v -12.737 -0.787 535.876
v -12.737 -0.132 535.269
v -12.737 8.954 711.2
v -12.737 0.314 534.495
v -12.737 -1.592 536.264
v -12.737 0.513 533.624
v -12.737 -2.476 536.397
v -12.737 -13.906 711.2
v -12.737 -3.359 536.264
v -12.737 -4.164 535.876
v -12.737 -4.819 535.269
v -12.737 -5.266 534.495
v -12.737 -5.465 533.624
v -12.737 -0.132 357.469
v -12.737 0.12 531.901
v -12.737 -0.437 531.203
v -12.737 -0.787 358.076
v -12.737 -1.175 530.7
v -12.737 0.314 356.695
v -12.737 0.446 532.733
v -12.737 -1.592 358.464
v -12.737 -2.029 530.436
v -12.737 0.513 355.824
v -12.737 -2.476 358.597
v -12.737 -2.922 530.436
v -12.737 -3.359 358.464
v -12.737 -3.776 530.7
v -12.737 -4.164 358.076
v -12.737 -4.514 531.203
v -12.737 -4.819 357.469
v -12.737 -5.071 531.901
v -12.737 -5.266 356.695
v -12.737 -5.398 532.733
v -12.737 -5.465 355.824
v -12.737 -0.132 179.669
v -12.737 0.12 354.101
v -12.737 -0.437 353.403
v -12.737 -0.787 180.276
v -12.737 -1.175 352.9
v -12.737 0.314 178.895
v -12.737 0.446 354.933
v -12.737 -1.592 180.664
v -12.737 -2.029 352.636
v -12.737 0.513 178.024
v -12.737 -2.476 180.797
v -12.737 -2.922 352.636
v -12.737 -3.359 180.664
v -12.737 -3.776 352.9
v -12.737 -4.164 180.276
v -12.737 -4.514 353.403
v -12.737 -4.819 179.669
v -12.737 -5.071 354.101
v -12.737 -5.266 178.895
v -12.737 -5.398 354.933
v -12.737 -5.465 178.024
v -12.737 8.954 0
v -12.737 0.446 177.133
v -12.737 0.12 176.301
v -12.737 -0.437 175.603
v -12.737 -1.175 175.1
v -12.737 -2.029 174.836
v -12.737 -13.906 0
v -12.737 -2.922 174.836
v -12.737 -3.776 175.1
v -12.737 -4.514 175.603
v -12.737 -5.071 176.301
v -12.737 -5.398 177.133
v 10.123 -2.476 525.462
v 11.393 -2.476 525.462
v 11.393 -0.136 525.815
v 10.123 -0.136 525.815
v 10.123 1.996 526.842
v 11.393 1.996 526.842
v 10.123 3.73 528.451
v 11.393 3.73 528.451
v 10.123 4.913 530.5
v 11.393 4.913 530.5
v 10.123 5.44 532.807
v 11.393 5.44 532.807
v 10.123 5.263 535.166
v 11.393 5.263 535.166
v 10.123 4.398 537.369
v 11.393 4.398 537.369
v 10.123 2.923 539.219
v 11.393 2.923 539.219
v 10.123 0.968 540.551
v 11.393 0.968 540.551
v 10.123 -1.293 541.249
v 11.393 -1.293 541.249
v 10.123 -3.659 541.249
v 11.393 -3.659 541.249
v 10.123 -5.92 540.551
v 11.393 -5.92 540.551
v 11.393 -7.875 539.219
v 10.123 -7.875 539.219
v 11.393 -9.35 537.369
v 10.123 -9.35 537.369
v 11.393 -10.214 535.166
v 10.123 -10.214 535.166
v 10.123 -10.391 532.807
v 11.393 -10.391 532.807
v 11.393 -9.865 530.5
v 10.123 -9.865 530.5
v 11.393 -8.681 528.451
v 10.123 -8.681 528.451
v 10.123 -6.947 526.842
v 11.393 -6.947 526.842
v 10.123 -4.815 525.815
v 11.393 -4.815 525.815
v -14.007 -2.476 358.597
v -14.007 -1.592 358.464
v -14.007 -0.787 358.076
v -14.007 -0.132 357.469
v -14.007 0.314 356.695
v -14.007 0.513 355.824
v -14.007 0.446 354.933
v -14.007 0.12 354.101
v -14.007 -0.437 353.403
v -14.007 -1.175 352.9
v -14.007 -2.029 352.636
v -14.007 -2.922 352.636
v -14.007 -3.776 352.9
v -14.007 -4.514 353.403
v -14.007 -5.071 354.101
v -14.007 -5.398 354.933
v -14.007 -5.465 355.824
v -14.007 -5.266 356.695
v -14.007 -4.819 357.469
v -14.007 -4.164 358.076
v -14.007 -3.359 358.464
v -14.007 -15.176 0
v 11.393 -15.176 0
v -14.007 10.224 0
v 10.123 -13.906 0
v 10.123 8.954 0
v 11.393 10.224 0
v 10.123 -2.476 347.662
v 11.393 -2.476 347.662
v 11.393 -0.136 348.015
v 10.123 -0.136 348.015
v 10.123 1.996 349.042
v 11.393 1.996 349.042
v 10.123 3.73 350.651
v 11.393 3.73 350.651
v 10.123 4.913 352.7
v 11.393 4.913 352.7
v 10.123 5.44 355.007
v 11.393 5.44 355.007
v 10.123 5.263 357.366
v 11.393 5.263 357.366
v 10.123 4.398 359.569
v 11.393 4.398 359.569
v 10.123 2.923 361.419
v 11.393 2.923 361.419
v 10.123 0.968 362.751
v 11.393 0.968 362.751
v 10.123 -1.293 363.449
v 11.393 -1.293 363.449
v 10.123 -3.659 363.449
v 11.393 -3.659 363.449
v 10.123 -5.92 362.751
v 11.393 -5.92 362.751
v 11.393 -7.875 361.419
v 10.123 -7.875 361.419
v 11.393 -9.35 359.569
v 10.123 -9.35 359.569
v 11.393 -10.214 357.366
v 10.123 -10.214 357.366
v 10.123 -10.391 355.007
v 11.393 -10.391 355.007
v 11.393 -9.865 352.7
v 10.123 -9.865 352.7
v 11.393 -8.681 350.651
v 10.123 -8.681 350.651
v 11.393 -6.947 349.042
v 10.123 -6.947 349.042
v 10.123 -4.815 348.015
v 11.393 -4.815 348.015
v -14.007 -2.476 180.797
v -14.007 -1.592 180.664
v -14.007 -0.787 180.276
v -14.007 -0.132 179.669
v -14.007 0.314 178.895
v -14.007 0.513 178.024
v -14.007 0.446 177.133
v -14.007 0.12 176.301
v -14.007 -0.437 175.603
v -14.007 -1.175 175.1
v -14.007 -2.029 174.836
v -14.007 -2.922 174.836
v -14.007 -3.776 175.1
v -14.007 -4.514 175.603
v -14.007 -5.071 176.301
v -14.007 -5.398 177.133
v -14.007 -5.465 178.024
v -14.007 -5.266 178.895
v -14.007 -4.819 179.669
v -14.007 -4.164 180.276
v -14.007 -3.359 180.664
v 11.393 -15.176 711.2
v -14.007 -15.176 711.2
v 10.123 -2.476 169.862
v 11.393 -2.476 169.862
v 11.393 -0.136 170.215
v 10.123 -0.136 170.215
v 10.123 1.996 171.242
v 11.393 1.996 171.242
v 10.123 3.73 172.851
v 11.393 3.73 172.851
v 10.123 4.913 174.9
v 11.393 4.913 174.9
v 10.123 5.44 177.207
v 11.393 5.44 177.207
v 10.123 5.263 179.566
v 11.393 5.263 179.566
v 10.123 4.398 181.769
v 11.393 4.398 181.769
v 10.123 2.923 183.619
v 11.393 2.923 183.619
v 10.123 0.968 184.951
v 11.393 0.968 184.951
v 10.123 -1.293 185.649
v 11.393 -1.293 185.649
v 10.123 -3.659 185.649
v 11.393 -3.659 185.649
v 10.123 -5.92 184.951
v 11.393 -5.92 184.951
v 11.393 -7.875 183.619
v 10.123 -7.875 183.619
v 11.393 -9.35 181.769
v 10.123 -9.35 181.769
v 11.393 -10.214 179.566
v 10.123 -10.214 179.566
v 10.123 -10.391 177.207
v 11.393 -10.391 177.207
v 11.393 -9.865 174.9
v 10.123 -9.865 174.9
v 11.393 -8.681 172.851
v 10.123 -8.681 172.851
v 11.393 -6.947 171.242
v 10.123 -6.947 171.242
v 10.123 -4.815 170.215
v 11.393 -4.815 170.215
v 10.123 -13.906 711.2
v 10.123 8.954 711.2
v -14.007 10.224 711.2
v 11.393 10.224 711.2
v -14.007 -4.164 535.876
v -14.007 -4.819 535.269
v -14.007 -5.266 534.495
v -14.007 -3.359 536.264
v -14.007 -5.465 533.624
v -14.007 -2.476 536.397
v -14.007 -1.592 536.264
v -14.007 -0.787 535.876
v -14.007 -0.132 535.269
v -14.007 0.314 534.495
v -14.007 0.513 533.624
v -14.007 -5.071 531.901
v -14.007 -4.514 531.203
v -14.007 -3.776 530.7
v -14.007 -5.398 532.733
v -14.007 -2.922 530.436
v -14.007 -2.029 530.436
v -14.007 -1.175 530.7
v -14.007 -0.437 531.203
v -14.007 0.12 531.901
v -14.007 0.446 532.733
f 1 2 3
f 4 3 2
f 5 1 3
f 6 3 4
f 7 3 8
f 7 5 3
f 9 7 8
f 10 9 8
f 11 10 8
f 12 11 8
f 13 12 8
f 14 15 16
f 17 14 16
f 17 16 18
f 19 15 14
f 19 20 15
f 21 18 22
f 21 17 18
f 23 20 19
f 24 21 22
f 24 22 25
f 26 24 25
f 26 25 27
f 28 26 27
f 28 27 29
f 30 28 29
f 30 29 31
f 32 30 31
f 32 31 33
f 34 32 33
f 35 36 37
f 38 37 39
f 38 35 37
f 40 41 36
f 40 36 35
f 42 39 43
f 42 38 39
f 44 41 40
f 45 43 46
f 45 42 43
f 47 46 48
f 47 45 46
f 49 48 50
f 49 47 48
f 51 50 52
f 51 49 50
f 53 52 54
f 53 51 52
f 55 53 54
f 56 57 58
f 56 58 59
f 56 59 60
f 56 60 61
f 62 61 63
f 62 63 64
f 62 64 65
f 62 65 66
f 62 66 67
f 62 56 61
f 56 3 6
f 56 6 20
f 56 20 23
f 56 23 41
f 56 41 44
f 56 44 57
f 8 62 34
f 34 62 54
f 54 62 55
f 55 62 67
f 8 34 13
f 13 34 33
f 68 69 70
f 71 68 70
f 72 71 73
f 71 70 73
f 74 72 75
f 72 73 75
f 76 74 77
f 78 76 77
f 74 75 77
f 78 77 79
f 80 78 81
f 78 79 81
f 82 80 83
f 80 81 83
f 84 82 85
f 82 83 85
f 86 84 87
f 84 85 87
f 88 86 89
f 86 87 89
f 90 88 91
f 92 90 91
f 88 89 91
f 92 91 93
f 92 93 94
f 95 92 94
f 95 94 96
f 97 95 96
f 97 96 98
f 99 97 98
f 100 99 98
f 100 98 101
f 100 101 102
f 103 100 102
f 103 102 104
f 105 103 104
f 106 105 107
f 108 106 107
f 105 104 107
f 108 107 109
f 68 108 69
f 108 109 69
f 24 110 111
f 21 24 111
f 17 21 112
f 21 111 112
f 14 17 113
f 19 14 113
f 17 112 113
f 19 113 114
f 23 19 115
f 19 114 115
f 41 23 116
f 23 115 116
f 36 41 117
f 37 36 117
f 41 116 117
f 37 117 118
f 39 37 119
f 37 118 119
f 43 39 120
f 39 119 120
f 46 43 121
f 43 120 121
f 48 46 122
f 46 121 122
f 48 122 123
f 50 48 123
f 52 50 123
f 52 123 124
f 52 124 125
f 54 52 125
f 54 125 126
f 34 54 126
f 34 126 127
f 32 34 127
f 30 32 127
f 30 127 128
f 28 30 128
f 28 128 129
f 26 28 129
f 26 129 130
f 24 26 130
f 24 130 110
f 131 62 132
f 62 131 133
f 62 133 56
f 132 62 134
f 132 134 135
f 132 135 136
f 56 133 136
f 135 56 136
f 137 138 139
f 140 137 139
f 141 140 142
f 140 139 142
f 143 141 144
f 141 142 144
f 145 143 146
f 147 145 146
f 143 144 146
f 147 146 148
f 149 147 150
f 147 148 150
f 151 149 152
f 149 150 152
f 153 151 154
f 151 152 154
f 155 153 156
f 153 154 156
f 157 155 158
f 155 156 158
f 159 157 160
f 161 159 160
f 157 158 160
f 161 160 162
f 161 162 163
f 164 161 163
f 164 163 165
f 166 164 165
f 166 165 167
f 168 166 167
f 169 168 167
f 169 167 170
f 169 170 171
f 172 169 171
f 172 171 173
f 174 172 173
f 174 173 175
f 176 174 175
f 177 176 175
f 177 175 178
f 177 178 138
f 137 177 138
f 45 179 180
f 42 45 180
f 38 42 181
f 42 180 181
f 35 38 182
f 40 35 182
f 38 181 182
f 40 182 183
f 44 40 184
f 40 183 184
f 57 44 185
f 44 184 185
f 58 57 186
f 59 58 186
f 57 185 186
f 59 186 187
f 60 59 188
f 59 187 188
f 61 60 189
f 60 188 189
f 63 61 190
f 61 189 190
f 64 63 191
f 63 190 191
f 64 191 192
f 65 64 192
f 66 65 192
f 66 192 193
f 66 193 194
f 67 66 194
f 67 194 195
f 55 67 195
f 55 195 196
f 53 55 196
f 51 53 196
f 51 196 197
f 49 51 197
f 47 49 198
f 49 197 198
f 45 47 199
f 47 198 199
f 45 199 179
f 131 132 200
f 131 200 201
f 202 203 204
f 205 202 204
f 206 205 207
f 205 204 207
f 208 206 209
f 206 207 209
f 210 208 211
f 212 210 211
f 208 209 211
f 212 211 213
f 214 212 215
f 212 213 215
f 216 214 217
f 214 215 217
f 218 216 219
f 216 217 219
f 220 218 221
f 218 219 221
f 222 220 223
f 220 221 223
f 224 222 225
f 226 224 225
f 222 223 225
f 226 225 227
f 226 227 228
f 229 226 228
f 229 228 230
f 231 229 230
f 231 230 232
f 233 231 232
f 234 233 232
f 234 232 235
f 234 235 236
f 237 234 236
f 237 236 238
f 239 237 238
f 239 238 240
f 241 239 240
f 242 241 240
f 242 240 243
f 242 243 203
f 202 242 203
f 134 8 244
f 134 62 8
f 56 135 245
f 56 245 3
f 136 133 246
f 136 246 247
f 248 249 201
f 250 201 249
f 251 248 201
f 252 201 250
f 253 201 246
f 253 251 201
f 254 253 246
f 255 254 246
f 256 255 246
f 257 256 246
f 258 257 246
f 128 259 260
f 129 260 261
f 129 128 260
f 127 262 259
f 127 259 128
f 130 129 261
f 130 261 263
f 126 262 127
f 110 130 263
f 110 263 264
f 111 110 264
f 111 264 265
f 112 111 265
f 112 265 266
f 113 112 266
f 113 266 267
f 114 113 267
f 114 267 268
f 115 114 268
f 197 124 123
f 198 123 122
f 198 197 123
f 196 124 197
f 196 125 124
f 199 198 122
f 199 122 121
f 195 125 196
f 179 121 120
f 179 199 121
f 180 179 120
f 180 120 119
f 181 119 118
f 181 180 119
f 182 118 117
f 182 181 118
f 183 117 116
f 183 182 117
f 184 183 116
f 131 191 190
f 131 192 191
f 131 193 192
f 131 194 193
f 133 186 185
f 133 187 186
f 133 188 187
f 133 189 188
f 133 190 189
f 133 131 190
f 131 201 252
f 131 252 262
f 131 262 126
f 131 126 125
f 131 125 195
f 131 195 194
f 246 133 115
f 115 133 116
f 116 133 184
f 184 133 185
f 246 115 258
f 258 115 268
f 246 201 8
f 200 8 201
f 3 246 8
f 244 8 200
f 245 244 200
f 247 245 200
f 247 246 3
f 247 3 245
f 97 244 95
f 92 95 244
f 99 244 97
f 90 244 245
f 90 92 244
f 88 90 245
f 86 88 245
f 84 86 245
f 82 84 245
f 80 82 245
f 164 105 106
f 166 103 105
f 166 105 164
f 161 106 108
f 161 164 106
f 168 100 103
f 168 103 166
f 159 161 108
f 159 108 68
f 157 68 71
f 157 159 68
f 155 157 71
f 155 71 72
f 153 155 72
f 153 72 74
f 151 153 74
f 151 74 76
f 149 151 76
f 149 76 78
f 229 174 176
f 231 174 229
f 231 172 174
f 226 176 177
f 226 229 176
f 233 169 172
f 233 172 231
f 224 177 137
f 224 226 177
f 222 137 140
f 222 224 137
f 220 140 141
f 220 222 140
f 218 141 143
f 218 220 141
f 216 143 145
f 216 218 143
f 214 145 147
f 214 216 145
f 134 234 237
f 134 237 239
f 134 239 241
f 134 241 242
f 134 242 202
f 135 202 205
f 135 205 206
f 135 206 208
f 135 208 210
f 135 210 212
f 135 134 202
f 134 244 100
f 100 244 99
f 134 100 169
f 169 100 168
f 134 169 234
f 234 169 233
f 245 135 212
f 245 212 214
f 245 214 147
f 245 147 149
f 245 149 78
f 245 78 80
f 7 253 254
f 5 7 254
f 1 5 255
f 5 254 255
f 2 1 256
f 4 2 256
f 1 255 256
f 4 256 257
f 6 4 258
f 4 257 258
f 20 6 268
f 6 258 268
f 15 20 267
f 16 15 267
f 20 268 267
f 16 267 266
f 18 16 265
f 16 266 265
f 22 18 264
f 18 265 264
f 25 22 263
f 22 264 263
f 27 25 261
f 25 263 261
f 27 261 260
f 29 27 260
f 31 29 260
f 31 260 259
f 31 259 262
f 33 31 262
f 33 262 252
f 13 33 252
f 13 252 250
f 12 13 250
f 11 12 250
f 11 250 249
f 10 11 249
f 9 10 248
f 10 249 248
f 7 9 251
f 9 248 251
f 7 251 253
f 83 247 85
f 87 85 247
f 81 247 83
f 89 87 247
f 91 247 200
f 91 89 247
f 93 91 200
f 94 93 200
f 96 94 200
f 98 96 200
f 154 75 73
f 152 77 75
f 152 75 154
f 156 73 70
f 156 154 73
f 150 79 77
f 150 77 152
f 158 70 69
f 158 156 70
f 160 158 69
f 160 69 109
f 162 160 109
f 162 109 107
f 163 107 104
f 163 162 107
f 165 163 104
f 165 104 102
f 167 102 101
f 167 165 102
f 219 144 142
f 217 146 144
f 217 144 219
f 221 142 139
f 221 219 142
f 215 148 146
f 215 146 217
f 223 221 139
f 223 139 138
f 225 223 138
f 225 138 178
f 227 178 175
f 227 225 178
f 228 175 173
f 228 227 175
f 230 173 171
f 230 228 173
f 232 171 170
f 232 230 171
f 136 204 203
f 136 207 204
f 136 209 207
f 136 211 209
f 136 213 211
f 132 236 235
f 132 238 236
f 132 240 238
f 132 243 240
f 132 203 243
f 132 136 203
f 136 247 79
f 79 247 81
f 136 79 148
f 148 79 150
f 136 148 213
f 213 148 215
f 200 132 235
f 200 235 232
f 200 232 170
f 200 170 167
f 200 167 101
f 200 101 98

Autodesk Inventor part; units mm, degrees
ref_plane "YZ Plane" through (0, 0, 0) normal (1, 0, 0) x (0, 1, 0)
ref_plane "XZ Plane" through (0, 0, 0) normal (0, 1, 0) x (-1, 0, 0)
ref_plane "XY Plane" through (0, 0, 0) normal (0, 0, 1) x (1, 0, 0)
sketch "Sketch1" plane through (0, 0, 0) normal (0, 0, 1) x (1, 0, 0)
  line L0 (-14.0074, 10.2243) -> (11.3926, 10.2243)
  line L1 (11.3926, 10.2243) -> (11.3926, -15.1757)
  line L2 (11.3926, -15.1757) -> (-14.0074, -15.1757)
  line L3 (-14.0074, -15.1757) -> (-14.0074, 10.2243)
  line L4 (10.1226, 8.9543) -> (-12.7374, 8.9543)
  line L5 (-12.7374, 8.9543) -> (-12.7374, -13.9057)
  line L6 (-12.7374, -13.9057) -> (10.1226, -13.9057)
  line L7 (10.1226, -13.9057) -> (10.1226, 8.9543)
  point P0 (0, 0)
  dimension "d0" = 25.4
  dimension "d1" = 1.27
extrude "Extrusion1" add sketch "Sketch1" along normal blind 711.2
sketch "Sketch2" plane through (11.3926, -15.1757, 0) normal (1, 0, 0) x (0, 0, -1)
  circle A0 centre (-355.6, 12.7) radius 7.9375
  line L0 (-711.2, 1.27) -> (-711.2, 24.13) projected
  line L1 (-711.2, 12.7) -> (0, 12.7) construction
  line L2 (0, 25.4) -> (0, 0) projected
  circle A1 centre (-533.4, 12.7) radius 7.9375
  circle A2 centre (-177.8, 12.7) radius 7.9375
  point P0 (0, 15.1757)
  dimension "d5" = 15.875
  dimension "d6" = 177.8
  dimension "d7" = 177.8
  dimension "d8" = 355.6
extrude "Extrusion2" cut sketch "Sketch2" against normal blind 2.54
sketch "Sketch3" plane through (-14.0074, -15.1757, 0) normal (-1, 0, 0) x (0, 0, 1)
  circle A0 centre (177.8, 12.7) radius 7.9375 construction
  circle A1 centre (355.6, 12.7) radius 7.9375 construction
  circle A2 centre (533.4, 12.7) radius 7.9375 construction
  circle A3 centre (177.8, 12.7) radius 2.9972
  circle A4 centre (355.6, 12.7) radius 2.9972
  circle A5 centre (533.4, 12.7) radius 2.9972
  point P0 (0, 15.1757)
  dimension "d11" = 5.9944
extrude "Extrusion3" cut sketch "Sketch3" against normal blind 2.54
equation "\"d6\" = d4"
equation "\"d7\" = d4"
equation "\"d8\" = 0.5 * d2"
equation "\"d4\" = 177.8"
equation "\"d2\" = 711.2"
properties part number "1x1 28in WChurro Holes"
